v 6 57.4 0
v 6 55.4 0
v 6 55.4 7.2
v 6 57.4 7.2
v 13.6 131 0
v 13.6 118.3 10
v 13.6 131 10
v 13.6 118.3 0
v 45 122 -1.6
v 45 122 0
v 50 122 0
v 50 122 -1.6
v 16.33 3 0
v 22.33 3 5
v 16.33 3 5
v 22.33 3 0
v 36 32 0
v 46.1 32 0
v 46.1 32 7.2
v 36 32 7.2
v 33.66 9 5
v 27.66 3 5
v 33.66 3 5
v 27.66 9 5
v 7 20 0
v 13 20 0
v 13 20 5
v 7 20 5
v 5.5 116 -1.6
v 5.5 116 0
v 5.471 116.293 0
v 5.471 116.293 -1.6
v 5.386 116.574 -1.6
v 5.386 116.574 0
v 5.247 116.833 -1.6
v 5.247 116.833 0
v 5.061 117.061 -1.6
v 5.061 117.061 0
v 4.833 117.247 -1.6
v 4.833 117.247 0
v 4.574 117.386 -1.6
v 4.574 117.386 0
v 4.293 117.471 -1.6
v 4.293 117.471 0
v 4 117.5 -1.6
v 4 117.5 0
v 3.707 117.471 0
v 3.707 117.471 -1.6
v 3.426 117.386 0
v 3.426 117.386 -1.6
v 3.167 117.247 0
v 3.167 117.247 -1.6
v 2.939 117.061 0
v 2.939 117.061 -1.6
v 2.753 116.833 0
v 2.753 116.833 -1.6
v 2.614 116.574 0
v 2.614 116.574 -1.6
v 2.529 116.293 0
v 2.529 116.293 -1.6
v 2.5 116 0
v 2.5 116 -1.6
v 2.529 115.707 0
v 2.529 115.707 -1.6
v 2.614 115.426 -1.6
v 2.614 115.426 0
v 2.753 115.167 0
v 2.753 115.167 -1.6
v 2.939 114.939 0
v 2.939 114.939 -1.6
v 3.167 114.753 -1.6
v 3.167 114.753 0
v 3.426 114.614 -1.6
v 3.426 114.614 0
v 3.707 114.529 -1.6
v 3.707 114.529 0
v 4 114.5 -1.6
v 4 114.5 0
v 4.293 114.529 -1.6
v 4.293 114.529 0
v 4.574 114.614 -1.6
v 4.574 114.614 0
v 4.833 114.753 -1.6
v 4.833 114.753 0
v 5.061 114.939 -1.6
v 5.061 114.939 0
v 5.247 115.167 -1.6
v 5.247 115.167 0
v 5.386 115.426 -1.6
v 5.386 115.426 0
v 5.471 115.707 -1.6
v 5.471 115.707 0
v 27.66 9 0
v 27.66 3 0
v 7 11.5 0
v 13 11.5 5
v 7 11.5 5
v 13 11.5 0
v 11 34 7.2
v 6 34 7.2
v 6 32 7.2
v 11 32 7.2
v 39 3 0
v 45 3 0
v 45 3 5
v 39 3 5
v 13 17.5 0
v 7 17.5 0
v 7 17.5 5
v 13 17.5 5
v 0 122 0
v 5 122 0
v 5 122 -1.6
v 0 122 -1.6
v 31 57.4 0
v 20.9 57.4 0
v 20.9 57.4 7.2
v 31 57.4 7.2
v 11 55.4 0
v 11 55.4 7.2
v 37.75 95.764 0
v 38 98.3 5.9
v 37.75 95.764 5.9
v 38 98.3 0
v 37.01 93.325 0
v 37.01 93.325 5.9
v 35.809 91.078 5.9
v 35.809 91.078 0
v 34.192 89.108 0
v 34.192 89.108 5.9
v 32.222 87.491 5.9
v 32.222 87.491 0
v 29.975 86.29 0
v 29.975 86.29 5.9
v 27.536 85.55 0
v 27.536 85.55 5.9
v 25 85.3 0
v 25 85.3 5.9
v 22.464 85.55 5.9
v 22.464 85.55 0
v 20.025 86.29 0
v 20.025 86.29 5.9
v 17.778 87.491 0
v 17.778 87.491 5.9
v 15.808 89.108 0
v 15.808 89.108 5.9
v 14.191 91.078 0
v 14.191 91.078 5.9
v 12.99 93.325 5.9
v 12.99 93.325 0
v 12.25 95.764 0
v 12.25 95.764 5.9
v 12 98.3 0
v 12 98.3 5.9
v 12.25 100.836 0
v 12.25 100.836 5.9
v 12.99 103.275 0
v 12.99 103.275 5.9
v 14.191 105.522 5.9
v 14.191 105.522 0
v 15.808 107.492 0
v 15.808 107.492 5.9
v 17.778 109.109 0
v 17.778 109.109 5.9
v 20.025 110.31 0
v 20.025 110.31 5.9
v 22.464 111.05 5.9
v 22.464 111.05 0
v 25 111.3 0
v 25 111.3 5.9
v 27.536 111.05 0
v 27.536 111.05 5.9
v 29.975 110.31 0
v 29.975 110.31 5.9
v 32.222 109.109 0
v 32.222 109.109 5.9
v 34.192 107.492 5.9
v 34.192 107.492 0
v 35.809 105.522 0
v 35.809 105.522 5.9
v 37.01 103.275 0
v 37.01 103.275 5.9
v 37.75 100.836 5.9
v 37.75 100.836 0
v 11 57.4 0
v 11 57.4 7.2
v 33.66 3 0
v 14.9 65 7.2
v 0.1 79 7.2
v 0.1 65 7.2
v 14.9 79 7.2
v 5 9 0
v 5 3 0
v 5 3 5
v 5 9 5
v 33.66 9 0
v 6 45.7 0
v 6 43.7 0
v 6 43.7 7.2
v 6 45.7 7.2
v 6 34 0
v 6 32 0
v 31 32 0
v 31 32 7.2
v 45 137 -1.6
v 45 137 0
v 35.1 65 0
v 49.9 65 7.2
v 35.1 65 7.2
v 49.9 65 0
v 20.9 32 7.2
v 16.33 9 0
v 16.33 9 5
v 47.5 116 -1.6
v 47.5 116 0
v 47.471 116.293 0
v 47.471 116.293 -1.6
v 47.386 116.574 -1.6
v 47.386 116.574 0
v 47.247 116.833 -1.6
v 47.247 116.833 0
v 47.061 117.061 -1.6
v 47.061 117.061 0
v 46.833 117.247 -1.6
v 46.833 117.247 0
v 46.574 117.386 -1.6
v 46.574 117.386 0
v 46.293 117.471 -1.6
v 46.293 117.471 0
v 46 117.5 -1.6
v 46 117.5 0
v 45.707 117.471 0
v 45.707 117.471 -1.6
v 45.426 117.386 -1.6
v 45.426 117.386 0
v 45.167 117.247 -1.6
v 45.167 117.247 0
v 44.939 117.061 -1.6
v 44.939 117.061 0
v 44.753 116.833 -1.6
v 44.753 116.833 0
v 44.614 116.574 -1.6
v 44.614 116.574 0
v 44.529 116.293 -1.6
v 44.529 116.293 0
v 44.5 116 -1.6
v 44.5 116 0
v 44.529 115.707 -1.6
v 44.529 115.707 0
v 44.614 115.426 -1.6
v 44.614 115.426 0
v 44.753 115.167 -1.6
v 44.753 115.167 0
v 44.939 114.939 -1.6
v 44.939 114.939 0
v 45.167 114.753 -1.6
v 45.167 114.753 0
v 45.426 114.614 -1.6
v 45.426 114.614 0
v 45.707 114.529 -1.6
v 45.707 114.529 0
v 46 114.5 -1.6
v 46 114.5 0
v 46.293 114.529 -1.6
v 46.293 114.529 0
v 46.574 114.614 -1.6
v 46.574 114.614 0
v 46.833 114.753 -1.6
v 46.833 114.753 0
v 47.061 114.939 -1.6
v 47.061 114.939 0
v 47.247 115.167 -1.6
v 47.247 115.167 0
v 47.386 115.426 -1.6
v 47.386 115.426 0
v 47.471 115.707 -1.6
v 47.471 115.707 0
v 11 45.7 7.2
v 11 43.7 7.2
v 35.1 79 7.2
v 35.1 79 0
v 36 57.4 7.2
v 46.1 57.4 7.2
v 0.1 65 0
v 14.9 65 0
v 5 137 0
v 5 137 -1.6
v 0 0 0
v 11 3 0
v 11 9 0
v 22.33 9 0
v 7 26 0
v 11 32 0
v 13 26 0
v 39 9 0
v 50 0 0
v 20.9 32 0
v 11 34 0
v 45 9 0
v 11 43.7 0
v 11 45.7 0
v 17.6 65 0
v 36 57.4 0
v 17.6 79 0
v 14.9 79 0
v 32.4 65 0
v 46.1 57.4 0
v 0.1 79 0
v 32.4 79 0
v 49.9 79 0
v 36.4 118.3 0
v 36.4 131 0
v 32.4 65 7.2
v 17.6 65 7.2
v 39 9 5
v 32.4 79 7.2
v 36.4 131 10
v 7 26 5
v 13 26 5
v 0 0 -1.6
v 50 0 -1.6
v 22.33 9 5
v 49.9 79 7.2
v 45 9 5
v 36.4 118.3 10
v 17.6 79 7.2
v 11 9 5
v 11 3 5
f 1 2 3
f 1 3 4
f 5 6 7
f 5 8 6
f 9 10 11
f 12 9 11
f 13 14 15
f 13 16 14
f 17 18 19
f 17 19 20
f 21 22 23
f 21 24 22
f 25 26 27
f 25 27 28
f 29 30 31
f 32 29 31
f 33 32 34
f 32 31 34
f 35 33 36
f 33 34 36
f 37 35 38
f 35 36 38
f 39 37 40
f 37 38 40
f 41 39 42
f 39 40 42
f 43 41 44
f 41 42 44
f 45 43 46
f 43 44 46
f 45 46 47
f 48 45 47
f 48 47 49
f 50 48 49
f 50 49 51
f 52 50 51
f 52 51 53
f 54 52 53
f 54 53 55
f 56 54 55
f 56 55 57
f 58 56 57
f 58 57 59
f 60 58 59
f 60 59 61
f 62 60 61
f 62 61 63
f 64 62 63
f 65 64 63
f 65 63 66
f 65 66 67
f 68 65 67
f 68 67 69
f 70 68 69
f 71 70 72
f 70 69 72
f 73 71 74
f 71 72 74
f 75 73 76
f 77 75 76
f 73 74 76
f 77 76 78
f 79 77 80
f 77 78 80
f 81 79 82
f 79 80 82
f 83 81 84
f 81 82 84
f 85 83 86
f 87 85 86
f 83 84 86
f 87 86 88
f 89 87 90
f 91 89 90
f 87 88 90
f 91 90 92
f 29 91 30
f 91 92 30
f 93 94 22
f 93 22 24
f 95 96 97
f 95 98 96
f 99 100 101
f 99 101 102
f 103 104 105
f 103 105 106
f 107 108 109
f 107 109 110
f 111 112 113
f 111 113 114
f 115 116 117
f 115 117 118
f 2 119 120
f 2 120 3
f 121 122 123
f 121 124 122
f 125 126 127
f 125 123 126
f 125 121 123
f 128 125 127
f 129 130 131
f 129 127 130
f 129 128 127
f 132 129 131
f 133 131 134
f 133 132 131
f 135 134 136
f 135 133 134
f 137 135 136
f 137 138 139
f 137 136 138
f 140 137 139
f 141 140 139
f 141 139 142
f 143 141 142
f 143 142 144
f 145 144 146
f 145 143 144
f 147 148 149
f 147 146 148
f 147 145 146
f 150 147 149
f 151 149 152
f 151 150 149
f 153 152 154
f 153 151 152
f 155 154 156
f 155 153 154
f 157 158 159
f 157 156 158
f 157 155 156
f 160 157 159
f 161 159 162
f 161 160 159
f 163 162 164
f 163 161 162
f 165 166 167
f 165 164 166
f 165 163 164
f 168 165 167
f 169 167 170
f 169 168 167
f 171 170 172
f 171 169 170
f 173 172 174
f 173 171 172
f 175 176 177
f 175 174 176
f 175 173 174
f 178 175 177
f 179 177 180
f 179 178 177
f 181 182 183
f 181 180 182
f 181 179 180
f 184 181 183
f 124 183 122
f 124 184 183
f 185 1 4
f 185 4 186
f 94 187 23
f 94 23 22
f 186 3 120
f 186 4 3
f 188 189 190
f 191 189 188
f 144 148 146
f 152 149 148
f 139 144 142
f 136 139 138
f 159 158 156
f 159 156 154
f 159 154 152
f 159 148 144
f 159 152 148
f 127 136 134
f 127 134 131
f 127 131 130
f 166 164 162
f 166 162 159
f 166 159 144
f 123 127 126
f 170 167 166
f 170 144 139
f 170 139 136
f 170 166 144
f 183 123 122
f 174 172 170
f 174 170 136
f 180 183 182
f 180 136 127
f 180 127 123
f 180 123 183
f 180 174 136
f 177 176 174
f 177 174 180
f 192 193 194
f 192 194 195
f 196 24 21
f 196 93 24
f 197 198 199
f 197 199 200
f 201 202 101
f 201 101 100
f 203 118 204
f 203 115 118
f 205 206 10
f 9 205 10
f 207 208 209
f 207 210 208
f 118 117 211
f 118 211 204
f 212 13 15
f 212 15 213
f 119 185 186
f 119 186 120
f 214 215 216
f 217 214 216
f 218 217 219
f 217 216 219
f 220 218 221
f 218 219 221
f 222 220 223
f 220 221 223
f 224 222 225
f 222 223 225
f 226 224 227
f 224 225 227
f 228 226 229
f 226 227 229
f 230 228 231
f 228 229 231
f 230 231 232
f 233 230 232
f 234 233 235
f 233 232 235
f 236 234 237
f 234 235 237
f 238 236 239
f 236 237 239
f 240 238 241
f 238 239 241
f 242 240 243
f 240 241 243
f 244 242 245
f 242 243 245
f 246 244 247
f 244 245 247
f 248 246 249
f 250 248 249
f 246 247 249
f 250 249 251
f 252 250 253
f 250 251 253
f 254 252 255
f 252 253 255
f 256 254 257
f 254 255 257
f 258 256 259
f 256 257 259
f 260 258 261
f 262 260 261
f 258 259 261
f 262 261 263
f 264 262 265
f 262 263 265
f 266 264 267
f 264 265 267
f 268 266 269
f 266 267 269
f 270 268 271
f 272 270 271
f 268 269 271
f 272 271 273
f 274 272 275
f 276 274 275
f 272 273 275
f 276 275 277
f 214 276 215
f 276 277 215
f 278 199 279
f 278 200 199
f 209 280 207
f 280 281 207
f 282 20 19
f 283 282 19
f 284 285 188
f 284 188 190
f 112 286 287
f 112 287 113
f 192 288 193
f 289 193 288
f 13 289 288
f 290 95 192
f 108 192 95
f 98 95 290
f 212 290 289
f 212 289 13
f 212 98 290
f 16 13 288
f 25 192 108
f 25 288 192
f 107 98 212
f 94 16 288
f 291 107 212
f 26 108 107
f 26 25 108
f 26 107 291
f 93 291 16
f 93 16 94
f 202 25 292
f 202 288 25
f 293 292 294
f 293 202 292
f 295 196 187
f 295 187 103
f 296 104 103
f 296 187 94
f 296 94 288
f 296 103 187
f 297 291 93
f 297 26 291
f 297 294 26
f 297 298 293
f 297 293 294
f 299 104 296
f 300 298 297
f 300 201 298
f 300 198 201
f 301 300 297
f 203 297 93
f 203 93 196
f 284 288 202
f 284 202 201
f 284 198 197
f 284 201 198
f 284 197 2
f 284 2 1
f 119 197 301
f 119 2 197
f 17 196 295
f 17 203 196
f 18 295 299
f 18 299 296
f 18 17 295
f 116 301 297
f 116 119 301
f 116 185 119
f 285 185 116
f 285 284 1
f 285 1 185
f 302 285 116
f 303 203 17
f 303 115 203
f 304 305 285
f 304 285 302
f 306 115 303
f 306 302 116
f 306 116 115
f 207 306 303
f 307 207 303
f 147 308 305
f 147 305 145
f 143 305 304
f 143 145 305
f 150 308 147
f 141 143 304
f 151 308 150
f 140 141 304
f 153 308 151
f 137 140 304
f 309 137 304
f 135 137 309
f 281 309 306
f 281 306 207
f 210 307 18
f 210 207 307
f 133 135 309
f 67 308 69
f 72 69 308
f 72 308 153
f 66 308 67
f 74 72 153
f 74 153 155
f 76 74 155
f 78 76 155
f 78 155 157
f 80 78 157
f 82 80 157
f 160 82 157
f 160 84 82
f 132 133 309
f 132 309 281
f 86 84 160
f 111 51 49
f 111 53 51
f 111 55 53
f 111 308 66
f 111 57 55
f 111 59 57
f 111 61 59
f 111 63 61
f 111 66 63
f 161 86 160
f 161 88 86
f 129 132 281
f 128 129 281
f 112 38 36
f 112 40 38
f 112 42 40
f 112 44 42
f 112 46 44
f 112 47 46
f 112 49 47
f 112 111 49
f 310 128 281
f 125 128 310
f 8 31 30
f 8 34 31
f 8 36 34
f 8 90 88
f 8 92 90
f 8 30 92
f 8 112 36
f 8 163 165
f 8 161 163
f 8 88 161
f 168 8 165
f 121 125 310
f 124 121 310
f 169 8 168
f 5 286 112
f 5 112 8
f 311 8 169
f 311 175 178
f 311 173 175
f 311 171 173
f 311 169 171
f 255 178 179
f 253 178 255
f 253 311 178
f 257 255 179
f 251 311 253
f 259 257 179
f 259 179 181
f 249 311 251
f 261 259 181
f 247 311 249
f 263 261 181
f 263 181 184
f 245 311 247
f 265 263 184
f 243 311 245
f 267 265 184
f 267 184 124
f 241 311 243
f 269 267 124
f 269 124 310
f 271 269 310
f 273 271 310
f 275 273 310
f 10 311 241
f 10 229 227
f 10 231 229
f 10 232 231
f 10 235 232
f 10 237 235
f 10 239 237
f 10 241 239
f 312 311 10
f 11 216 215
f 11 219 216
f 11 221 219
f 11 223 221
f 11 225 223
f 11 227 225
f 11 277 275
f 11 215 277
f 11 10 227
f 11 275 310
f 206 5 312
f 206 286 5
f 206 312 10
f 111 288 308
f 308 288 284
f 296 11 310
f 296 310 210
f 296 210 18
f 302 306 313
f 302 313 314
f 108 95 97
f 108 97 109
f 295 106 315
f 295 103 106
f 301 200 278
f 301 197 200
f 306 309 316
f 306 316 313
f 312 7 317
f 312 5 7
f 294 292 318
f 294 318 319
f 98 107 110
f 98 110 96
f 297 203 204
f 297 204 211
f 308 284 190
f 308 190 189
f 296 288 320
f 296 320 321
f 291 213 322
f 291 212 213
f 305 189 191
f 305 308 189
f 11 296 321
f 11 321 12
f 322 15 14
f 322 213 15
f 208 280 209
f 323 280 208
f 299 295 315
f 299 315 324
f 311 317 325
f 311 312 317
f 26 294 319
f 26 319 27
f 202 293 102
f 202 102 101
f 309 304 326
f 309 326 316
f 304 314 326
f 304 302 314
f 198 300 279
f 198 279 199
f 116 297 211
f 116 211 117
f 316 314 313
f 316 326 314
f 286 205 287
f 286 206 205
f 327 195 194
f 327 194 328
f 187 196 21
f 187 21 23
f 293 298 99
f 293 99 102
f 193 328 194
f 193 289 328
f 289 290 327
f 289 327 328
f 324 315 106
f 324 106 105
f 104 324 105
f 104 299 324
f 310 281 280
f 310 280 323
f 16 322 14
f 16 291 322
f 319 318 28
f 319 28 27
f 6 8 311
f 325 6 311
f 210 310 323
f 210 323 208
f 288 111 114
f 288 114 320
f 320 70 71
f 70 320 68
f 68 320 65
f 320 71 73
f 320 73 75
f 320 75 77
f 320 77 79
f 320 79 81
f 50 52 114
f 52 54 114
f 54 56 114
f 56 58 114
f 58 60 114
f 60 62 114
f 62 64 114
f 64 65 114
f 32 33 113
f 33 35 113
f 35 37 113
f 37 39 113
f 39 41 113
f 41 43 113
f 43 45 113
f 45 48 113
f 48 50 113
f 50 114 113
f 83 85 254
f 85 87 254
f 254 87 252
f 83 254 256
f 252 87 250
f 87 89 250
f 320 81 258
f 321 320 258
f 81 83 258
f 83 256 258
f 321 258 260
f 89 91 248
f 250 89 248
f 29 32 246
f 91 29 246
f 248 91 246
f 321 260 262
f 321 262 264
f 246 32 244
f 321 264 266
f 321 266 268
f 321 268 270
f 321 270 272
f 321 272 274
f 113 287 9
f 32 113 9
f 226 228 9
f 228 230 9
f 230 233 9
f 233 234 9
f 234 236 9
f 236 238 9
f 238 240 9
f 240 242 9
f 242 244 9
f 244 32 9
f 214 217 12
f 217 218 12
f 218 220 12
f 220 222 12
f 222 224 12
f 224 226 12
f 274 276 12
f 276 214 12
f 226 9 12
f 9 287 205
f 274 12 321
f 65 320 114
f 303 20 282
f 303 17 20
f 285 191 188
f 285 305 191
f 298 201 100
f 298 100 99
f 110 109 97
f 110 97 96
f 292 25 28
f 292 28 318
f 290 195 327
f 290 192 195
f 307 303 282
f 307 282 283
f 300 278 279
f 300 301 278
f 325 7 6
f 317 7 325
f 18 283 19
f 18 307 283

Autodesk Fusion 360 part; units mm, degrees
sketch "Sketch1" plane through (0, 0, 0) normal (0, 0, 1) x (1, 0, 0)
  line L0 (0, 0) -> (50, 0)
  line L1 (50, 0) -> (50, 137)
  line L2 (50, 137) -> (0, 137)
  line L3 (0, 137) -> (0, 0)
  line L4 (6, 57.4) -> (11, 57.4)
  line L5 (11, 57.4) -> (11, 55.4)
  line L6 (11, 55.4) -> (6, 55.4)
  line L7 (6, 55.4) -> (6, 57.4)
  line L8 (6, 45.7) -> (11, 45.7)
  line L9 (11, 45.7) -> (11, 43.7)
  line L10 (11, 43.7) -> (6, 43.7)
  line L11 (6, 43.7) -> (6, 45.7)
  line L12 (6, 34) -> (11, 34)
  line L13 (11, 34) -> (11, 32)
  line L14 (11, 32) -> (6, 32)
  line L15 (6, 32) -> (6, 34)
  line L16 (36, 57.4) -> (46.1, 57.4)
  line L17 (46.1, 57.4) -> (46.1, 32)
  line L18 (46.1, 32) -> (36, 32)
  line L19 (36, 32) -> (36, 57.4)
  line L20 (20.9, 57.4) -> (31, 57.4)
  line L21 (31, 57.4) -> (31, 32)
  line L22 (31, 32) -> (20.9, 32)
  line L23 (20.9, 32) -> (20.9, 57.4)
  line L24 (0.1, 79) -> (7.5, 79)
  line L25 (7.5, 79) -> (7.5, 65)
  line L26 (7.5, 65) -> (0.1, 65)
  line L27 (0.1, 65) -> (0.1, 79)
  line L28 (7.5, 65) -> (7.5, 79)
  line L29 (42.5, 79) -> (49.9, 79)
  line L30 (49.9, 79) -> (49.9, 65)
  line L31 (49.9, 65) -> (42.5, 65)
  line L32 (42.5, 65) -> (42.5, 79)
  line L33 (7.5, 79) -> (14.9, 79)
  line L34 (14.9, 79) -> (14.9, 65)
  line L35 (14.9, 65) -> (7.5, 65)
  line L36 (7.5, 65) -> (7.5, 79)
  line L37 (42.5, 79) -> (35.1, 79)
  line L38 (35.1, 79) -> (35.1, 65)
  line L39 (35.1, 65) -> (42.5, 65)
  line L40 (42.5, 65) -> (42.5, 79)
  line L41 (15.25, 79) -> (17.25, 79)
  line L42 (17.25, 79) -> (17.25, 76)
  line L43 (17.25, 76) -> (15.25, 76)
  line L44 (15.25, 76) -> (15.25, 79)
  line L45 (17.6, 79) -> (25, 79)
  line L46 (25, 79) -> (25, 65)
  line L47 (25, 65) -> (17.6, 65)
  line L48 (17.6, 65) -> (17.6, 79)
  line L49 (25, 79) -> (32.4, 79)
  line L50 (32.4, 79) -> (32.4, 65)
  line L51 (32.4, 65) -> (25, 65)
  line L52 (25, 65) -> (25, 79)
  line L53 (32.75, 78.921) -> (34.75, 78.921)
  line L54 (34.75, 78.921) -> (34.75, 75.921)
  line L55 (34.75, 75.921) -> (32.75, 75.921)
  line L56 (32.75, 75.921) -> (32.75, 78.921)
  line L57 (15.25, 68.4103) -> (17.25, 68.4103)
  line L58 (17.25, 68.4103) -> (17.25, 65.4103)
  line L59 (17.25, 65.4103) -> (15.25, 65.4103)
  line L60 (15.25, 65.4103) -> (15.25, 68.4103)
  line L61 (32.75, 68) -> (34.75, 68)
  line L62 (34.75, 68) -> (34.75, 65)
  line L63 (34.75, 65) -> (32.75, 65)
  line L64 (32.75, 65) -> (32.75, 68)
  line L65 (13.6, 131) -> (21.2, 131)
  line L66 (21.2, 131) -> (21.2, 118.3)
  line L67 (21.2, 118.3) -> (13.6, 118.3)
  line L68 (13.6, 118.3) -> (13.6, 131)
  line L69 (21.2, 131) -> (28.8, 131)
  line L70 (28.8, 131) -> (36.4, 131)
  line L71 (36.4, 131) -> (36.4, 118.3)
  line L72 (36.4, 118.3) -> (28.8, 118.3)
  line L73 (28.8, 118.3) -> (28.8, 131)
  line L74 (21.2, 131) -> (28.8, 131)
  line L75 (28.8, 131) -> (28.8, 118.3)
  line L76 (28.8, 118.3) -> (21.2, 118.3)
  line L77 (21.2, 118.3) -> (21.2, 131)
  circle A0 centre (25, 98.3) radius 13
  line L78 (7, 135) -> (12, 135)
  line L79 (12, 135) -> (12, 133)
  line L80 (12, 133) -> (7, 133)
  line L81 (7, 133) -> (7, 135)
  line L82 (38, 135) -> (43, 135)
  line L83 (43, 135) -> (43, 133)
  line L84 (43, 133) -> (38, 133)
  line L85 (38, 133) -> (38, 135)
  line L86 (5, 9) -> (11, 9)
  line L87 (11, 9) -> (11, 3)
  line L88 (11, 3) -> (5, 3)
  line L89 (5, 3) -> (5, 9)
  line L90 (39, 9) -> (45, 9)
  line L91 (45, 9) -> (45, 3)
  line L92 (45, 3) -> (39, 3)
  line L93 (39, 3) -> (39, 9)
  line L94 (16.33, 9) -> (22.33, 9)
  line L95 (22.33, 9) -> (22.33, 3)
  line L96 (22.33, 3) -> (16.33, 3)
  line L97 (16.33, 3) -> (16.33, 9)
  line L98 (27.66, 9) -> (33.66, 9)
  line L99 (33.66, 9) -> (33.66, 3)
  line L100 (33.66, 3) -> (27.66, 3)
  line L101 (27.66, 3) -> (27.66, 9)
  line L102 (7, 26) -> (13, 26)
  line L103 (13, 26) -> (13, 20)
  line L104 (13, 20) -> (7, 20)
  line L105 (7, 20) -> (7, 26)
  line L106 (7, 17.5) -> (13, 17.5)
  line L107 (13, 17.5) -> (13, 11.5)
  line L108 (13, 11.5) -> (7, 11.5)
  line L109 (7, 11.5) -> (7, 17.5)
  circle A1 centre (4, 116) radius 1.5
  circle A2 centre (46, 116) radius 1.5
  line L110 (0, 137) -> (5, 137)
  line L111 (5, 137) -> (5, 122)
  line L112 (5, 122) -> (0, 122)
  line L113 (0, 122) -> (0, 137)
  line L114 (50, 137) -> (45, 137)
  line L115 (45, 137) -> (45, 122)
  line L116 (45, 122) -> (50, 122)
  line L117 (50, 122) -> (50, 137)
  circle A3 centre (25, 98.3) radius 7.5
  dimension "d1" = 50
  dimension "d2" = 137
  dimension "d4" = 2
  dimension "d5" = 6
  dimension "d6" = 5
  dimension "d7" = 2
  dimension "d8" = 6
  dimension "d9" = 5
  dimension "d10" = 2
  dimension "d11" = 6
  dimension "d16" = 32
  dimension "d17" = 10.1
  dimension "d18" = 25.4
  dimension "d19" = 32
  dimension "d20" = 25.4
  dimension "d21" = 9.7
  dimension "d22" = 10.1
  dimension "d23" = 25.4
  dimension "d24" = 32
  dimension "d25" = 5
  dimension "d26" = 7.4
  dimension "d27" = 14
  dimension "d29" = 65
  dimension "d45" = 0.1
  dimension "d47" = 14
  dimension "d48" = 0.1
  dimension "d50" = 14
  dimension "d52" = 14
  dimension "d53" = 65
  dimension "d56" = 2
  dimension "d57" = 3
  dimension "d58" = 0.35
  dimension "d59" = 7.4
  dimension "d60" = 14
  dimension "d61" = 0.35
  dimension "d62" = 7.4
  dimension "d63" = 14
  dimension "d64" = 2
  dimension "d65" = 3
  dimension "d66" = 0.35
  dimension "d67" = 2
  dimension "d68" = 3
  dimension "d69" = 0.35
  dimension "d70" = 2
  dimension "d71" = 3
  dimension "d72" = 0.35
  dimension "d73" = 7.6
  dimension "d74" = 12.7
  dimension "d75" = 7.6
  dimension "d76" = 7.6
  dimension "d77" = 12.7
  dimension "d78" = 6
  dimension "d79" = 13.6
  dimension "d80" = 26
  dimension "d81" = 25
  dimension "d82" = 20
  dimension "d83" = 5
  dimension "d84" = 2
  dimension "d85" = 5
  dimension "d86" = 2
  dimension "d87" = 7
  dimension "d88" = 7
  dimension "d91" = 6
  dimension "d92" = 6
  dimension "d93" = 5
  dimension "d94" = 6
  dimension "d95" = 6
  dimension "d96" = 3
  dimension "d97" = 3
  dimension "d98" = 5
  dimension "d101" = 6
  dimension "d102" = 6
  dimension "d103" = 5.33
  dimension "d104" = 5.33
  dimension "d105" = 6
  dimension "d106" = 6
  dimension "d107" = 6
  dimension "d108" = 6
  dimension "d109" = 2.5
  dimension "d110" = 2.5
  dimension "d111" = 7
  dimension "d112" = 7
  dimension "d113" = 3
  dimension "d114" = 3
  dimension "d115" = 21
  dimension "d116" = 4
  dimension "d117" = 4
  dimension "d118" = 21
  dimension "d133" = 5
  dimension "d134" = 15
  dimension "d135" = 5
  dimension "d136" = 15
  dimension "d151" = 2
  dimension "d152" = 2
  dimension "d153" = 15
extrude "Extrude3" add sketch "Sketch1" against normal blind 1.6 contours L0 L1 L2 L3 L111 L112 L115 L116 | L2 L3 L110 L111 L112 L113 | L1 L2 L114 L115 L116 L117 | L4 L5 L6 L7 | L8 L9 L10 L11 | L12 L13 L14 L15 | L16 L17 L18 L19 | L20 L21 L22 L23 | L24 L25 L26 L27 L28 L36 | L25 L28 L33 L34 L35 L36 | L29 L30 L31 L32 L40 | L32 L37 L38 L39 L40 | L41 L42 L43 L44 | L45 L46 L47 L48 L52 | L46 L49 L50 L51 L52 | L53 L54 L55 L56 | L57 L58 L59 L60 | L61 L62 L63 L64 | L65 L66 L67 L68 L77 | L66 L69 L73 L74 L75 L76 L77 | L70 L71 L72 L73 L75 | A0 | L78 L79 L80 L81 | L82 L83 L84 L85 | L86 L87 L88 L89 | L90 L91 L92 L93 | L94 L95 L96 L97 | L98 L99 L100 L101 | L102 L103 L104 L105 | L106 L107 L108 L109 | A3
extrude "Extrude4" add sketch "Sketch1" along normal blind 7.2 contours L24 L25 L26 L27 L28 L36 | L25 L28 L33 L34 L35 L36 | L29 L30 L31 L32 L40 | L32 L37 L38 L39 L40 | L45 L46 L47 L48 L52 | L46 L49 L50 L51 L52
extrude "Extrude5" add sketch "Sketch1" along normal blind 7 contours L65 L66 L67 L68 L77 | L66 L69 L73 L74 L75 L76 L77 | L70 L71 L72 L73 L75
extrude "Extrude6" add sketch "Sketch1" along normal blind 7.2 contours L16 L17 L18 L19 | L20 L21 L22 L23
extrude "Extrude7" add sketch "Sketch1" along normal blind 7.2 contours L4 L5 L6 L7 | L8 L9 L10 L11 | L12 L13 L14 L15
extrude "Extrude8" cut sketch "Sketch1" against normal blind 15 contours L2 L3 L110 L111 L112 L113 | L1 L2 L114 L115 L116 L117
extrude "Extrude9" add sketch "Sketch1" along normal blind 7.9 contours A0 | A3
extrude "Extrude10" add 1 faces at (21.0958, 100.1802, 7.9) along direction (0, 0, 1) blind 2
extrude "Extrude11" add 1 faces at (21.0958, 100.1802, 9.9) along direction (0, 0, 1) blind 6
extrude "Extrude12" add 1 faces at (28.8, 122.5333, 7) along direction (0, 0, 1) blind 8
extrude "Extrude13" cut 1 faces at (21.0958, 100.1802, 15.9) along direction (0, 0, -1) blind 10
extrude "Extrude14" cut 1 faces at (28.8, 122.5333, 15) along direction (0, 0, -1) blind 5
extrude "Extrude15" add sketch "Sketch1" along normal blind 5 contours L86 L87 L88 L89 | L90 L91 L92 L93 | L94 L95 L96 L97 | L98 L99 L100 L101 | L102 L103 L104 L105 | L106 L107 L108 L109
